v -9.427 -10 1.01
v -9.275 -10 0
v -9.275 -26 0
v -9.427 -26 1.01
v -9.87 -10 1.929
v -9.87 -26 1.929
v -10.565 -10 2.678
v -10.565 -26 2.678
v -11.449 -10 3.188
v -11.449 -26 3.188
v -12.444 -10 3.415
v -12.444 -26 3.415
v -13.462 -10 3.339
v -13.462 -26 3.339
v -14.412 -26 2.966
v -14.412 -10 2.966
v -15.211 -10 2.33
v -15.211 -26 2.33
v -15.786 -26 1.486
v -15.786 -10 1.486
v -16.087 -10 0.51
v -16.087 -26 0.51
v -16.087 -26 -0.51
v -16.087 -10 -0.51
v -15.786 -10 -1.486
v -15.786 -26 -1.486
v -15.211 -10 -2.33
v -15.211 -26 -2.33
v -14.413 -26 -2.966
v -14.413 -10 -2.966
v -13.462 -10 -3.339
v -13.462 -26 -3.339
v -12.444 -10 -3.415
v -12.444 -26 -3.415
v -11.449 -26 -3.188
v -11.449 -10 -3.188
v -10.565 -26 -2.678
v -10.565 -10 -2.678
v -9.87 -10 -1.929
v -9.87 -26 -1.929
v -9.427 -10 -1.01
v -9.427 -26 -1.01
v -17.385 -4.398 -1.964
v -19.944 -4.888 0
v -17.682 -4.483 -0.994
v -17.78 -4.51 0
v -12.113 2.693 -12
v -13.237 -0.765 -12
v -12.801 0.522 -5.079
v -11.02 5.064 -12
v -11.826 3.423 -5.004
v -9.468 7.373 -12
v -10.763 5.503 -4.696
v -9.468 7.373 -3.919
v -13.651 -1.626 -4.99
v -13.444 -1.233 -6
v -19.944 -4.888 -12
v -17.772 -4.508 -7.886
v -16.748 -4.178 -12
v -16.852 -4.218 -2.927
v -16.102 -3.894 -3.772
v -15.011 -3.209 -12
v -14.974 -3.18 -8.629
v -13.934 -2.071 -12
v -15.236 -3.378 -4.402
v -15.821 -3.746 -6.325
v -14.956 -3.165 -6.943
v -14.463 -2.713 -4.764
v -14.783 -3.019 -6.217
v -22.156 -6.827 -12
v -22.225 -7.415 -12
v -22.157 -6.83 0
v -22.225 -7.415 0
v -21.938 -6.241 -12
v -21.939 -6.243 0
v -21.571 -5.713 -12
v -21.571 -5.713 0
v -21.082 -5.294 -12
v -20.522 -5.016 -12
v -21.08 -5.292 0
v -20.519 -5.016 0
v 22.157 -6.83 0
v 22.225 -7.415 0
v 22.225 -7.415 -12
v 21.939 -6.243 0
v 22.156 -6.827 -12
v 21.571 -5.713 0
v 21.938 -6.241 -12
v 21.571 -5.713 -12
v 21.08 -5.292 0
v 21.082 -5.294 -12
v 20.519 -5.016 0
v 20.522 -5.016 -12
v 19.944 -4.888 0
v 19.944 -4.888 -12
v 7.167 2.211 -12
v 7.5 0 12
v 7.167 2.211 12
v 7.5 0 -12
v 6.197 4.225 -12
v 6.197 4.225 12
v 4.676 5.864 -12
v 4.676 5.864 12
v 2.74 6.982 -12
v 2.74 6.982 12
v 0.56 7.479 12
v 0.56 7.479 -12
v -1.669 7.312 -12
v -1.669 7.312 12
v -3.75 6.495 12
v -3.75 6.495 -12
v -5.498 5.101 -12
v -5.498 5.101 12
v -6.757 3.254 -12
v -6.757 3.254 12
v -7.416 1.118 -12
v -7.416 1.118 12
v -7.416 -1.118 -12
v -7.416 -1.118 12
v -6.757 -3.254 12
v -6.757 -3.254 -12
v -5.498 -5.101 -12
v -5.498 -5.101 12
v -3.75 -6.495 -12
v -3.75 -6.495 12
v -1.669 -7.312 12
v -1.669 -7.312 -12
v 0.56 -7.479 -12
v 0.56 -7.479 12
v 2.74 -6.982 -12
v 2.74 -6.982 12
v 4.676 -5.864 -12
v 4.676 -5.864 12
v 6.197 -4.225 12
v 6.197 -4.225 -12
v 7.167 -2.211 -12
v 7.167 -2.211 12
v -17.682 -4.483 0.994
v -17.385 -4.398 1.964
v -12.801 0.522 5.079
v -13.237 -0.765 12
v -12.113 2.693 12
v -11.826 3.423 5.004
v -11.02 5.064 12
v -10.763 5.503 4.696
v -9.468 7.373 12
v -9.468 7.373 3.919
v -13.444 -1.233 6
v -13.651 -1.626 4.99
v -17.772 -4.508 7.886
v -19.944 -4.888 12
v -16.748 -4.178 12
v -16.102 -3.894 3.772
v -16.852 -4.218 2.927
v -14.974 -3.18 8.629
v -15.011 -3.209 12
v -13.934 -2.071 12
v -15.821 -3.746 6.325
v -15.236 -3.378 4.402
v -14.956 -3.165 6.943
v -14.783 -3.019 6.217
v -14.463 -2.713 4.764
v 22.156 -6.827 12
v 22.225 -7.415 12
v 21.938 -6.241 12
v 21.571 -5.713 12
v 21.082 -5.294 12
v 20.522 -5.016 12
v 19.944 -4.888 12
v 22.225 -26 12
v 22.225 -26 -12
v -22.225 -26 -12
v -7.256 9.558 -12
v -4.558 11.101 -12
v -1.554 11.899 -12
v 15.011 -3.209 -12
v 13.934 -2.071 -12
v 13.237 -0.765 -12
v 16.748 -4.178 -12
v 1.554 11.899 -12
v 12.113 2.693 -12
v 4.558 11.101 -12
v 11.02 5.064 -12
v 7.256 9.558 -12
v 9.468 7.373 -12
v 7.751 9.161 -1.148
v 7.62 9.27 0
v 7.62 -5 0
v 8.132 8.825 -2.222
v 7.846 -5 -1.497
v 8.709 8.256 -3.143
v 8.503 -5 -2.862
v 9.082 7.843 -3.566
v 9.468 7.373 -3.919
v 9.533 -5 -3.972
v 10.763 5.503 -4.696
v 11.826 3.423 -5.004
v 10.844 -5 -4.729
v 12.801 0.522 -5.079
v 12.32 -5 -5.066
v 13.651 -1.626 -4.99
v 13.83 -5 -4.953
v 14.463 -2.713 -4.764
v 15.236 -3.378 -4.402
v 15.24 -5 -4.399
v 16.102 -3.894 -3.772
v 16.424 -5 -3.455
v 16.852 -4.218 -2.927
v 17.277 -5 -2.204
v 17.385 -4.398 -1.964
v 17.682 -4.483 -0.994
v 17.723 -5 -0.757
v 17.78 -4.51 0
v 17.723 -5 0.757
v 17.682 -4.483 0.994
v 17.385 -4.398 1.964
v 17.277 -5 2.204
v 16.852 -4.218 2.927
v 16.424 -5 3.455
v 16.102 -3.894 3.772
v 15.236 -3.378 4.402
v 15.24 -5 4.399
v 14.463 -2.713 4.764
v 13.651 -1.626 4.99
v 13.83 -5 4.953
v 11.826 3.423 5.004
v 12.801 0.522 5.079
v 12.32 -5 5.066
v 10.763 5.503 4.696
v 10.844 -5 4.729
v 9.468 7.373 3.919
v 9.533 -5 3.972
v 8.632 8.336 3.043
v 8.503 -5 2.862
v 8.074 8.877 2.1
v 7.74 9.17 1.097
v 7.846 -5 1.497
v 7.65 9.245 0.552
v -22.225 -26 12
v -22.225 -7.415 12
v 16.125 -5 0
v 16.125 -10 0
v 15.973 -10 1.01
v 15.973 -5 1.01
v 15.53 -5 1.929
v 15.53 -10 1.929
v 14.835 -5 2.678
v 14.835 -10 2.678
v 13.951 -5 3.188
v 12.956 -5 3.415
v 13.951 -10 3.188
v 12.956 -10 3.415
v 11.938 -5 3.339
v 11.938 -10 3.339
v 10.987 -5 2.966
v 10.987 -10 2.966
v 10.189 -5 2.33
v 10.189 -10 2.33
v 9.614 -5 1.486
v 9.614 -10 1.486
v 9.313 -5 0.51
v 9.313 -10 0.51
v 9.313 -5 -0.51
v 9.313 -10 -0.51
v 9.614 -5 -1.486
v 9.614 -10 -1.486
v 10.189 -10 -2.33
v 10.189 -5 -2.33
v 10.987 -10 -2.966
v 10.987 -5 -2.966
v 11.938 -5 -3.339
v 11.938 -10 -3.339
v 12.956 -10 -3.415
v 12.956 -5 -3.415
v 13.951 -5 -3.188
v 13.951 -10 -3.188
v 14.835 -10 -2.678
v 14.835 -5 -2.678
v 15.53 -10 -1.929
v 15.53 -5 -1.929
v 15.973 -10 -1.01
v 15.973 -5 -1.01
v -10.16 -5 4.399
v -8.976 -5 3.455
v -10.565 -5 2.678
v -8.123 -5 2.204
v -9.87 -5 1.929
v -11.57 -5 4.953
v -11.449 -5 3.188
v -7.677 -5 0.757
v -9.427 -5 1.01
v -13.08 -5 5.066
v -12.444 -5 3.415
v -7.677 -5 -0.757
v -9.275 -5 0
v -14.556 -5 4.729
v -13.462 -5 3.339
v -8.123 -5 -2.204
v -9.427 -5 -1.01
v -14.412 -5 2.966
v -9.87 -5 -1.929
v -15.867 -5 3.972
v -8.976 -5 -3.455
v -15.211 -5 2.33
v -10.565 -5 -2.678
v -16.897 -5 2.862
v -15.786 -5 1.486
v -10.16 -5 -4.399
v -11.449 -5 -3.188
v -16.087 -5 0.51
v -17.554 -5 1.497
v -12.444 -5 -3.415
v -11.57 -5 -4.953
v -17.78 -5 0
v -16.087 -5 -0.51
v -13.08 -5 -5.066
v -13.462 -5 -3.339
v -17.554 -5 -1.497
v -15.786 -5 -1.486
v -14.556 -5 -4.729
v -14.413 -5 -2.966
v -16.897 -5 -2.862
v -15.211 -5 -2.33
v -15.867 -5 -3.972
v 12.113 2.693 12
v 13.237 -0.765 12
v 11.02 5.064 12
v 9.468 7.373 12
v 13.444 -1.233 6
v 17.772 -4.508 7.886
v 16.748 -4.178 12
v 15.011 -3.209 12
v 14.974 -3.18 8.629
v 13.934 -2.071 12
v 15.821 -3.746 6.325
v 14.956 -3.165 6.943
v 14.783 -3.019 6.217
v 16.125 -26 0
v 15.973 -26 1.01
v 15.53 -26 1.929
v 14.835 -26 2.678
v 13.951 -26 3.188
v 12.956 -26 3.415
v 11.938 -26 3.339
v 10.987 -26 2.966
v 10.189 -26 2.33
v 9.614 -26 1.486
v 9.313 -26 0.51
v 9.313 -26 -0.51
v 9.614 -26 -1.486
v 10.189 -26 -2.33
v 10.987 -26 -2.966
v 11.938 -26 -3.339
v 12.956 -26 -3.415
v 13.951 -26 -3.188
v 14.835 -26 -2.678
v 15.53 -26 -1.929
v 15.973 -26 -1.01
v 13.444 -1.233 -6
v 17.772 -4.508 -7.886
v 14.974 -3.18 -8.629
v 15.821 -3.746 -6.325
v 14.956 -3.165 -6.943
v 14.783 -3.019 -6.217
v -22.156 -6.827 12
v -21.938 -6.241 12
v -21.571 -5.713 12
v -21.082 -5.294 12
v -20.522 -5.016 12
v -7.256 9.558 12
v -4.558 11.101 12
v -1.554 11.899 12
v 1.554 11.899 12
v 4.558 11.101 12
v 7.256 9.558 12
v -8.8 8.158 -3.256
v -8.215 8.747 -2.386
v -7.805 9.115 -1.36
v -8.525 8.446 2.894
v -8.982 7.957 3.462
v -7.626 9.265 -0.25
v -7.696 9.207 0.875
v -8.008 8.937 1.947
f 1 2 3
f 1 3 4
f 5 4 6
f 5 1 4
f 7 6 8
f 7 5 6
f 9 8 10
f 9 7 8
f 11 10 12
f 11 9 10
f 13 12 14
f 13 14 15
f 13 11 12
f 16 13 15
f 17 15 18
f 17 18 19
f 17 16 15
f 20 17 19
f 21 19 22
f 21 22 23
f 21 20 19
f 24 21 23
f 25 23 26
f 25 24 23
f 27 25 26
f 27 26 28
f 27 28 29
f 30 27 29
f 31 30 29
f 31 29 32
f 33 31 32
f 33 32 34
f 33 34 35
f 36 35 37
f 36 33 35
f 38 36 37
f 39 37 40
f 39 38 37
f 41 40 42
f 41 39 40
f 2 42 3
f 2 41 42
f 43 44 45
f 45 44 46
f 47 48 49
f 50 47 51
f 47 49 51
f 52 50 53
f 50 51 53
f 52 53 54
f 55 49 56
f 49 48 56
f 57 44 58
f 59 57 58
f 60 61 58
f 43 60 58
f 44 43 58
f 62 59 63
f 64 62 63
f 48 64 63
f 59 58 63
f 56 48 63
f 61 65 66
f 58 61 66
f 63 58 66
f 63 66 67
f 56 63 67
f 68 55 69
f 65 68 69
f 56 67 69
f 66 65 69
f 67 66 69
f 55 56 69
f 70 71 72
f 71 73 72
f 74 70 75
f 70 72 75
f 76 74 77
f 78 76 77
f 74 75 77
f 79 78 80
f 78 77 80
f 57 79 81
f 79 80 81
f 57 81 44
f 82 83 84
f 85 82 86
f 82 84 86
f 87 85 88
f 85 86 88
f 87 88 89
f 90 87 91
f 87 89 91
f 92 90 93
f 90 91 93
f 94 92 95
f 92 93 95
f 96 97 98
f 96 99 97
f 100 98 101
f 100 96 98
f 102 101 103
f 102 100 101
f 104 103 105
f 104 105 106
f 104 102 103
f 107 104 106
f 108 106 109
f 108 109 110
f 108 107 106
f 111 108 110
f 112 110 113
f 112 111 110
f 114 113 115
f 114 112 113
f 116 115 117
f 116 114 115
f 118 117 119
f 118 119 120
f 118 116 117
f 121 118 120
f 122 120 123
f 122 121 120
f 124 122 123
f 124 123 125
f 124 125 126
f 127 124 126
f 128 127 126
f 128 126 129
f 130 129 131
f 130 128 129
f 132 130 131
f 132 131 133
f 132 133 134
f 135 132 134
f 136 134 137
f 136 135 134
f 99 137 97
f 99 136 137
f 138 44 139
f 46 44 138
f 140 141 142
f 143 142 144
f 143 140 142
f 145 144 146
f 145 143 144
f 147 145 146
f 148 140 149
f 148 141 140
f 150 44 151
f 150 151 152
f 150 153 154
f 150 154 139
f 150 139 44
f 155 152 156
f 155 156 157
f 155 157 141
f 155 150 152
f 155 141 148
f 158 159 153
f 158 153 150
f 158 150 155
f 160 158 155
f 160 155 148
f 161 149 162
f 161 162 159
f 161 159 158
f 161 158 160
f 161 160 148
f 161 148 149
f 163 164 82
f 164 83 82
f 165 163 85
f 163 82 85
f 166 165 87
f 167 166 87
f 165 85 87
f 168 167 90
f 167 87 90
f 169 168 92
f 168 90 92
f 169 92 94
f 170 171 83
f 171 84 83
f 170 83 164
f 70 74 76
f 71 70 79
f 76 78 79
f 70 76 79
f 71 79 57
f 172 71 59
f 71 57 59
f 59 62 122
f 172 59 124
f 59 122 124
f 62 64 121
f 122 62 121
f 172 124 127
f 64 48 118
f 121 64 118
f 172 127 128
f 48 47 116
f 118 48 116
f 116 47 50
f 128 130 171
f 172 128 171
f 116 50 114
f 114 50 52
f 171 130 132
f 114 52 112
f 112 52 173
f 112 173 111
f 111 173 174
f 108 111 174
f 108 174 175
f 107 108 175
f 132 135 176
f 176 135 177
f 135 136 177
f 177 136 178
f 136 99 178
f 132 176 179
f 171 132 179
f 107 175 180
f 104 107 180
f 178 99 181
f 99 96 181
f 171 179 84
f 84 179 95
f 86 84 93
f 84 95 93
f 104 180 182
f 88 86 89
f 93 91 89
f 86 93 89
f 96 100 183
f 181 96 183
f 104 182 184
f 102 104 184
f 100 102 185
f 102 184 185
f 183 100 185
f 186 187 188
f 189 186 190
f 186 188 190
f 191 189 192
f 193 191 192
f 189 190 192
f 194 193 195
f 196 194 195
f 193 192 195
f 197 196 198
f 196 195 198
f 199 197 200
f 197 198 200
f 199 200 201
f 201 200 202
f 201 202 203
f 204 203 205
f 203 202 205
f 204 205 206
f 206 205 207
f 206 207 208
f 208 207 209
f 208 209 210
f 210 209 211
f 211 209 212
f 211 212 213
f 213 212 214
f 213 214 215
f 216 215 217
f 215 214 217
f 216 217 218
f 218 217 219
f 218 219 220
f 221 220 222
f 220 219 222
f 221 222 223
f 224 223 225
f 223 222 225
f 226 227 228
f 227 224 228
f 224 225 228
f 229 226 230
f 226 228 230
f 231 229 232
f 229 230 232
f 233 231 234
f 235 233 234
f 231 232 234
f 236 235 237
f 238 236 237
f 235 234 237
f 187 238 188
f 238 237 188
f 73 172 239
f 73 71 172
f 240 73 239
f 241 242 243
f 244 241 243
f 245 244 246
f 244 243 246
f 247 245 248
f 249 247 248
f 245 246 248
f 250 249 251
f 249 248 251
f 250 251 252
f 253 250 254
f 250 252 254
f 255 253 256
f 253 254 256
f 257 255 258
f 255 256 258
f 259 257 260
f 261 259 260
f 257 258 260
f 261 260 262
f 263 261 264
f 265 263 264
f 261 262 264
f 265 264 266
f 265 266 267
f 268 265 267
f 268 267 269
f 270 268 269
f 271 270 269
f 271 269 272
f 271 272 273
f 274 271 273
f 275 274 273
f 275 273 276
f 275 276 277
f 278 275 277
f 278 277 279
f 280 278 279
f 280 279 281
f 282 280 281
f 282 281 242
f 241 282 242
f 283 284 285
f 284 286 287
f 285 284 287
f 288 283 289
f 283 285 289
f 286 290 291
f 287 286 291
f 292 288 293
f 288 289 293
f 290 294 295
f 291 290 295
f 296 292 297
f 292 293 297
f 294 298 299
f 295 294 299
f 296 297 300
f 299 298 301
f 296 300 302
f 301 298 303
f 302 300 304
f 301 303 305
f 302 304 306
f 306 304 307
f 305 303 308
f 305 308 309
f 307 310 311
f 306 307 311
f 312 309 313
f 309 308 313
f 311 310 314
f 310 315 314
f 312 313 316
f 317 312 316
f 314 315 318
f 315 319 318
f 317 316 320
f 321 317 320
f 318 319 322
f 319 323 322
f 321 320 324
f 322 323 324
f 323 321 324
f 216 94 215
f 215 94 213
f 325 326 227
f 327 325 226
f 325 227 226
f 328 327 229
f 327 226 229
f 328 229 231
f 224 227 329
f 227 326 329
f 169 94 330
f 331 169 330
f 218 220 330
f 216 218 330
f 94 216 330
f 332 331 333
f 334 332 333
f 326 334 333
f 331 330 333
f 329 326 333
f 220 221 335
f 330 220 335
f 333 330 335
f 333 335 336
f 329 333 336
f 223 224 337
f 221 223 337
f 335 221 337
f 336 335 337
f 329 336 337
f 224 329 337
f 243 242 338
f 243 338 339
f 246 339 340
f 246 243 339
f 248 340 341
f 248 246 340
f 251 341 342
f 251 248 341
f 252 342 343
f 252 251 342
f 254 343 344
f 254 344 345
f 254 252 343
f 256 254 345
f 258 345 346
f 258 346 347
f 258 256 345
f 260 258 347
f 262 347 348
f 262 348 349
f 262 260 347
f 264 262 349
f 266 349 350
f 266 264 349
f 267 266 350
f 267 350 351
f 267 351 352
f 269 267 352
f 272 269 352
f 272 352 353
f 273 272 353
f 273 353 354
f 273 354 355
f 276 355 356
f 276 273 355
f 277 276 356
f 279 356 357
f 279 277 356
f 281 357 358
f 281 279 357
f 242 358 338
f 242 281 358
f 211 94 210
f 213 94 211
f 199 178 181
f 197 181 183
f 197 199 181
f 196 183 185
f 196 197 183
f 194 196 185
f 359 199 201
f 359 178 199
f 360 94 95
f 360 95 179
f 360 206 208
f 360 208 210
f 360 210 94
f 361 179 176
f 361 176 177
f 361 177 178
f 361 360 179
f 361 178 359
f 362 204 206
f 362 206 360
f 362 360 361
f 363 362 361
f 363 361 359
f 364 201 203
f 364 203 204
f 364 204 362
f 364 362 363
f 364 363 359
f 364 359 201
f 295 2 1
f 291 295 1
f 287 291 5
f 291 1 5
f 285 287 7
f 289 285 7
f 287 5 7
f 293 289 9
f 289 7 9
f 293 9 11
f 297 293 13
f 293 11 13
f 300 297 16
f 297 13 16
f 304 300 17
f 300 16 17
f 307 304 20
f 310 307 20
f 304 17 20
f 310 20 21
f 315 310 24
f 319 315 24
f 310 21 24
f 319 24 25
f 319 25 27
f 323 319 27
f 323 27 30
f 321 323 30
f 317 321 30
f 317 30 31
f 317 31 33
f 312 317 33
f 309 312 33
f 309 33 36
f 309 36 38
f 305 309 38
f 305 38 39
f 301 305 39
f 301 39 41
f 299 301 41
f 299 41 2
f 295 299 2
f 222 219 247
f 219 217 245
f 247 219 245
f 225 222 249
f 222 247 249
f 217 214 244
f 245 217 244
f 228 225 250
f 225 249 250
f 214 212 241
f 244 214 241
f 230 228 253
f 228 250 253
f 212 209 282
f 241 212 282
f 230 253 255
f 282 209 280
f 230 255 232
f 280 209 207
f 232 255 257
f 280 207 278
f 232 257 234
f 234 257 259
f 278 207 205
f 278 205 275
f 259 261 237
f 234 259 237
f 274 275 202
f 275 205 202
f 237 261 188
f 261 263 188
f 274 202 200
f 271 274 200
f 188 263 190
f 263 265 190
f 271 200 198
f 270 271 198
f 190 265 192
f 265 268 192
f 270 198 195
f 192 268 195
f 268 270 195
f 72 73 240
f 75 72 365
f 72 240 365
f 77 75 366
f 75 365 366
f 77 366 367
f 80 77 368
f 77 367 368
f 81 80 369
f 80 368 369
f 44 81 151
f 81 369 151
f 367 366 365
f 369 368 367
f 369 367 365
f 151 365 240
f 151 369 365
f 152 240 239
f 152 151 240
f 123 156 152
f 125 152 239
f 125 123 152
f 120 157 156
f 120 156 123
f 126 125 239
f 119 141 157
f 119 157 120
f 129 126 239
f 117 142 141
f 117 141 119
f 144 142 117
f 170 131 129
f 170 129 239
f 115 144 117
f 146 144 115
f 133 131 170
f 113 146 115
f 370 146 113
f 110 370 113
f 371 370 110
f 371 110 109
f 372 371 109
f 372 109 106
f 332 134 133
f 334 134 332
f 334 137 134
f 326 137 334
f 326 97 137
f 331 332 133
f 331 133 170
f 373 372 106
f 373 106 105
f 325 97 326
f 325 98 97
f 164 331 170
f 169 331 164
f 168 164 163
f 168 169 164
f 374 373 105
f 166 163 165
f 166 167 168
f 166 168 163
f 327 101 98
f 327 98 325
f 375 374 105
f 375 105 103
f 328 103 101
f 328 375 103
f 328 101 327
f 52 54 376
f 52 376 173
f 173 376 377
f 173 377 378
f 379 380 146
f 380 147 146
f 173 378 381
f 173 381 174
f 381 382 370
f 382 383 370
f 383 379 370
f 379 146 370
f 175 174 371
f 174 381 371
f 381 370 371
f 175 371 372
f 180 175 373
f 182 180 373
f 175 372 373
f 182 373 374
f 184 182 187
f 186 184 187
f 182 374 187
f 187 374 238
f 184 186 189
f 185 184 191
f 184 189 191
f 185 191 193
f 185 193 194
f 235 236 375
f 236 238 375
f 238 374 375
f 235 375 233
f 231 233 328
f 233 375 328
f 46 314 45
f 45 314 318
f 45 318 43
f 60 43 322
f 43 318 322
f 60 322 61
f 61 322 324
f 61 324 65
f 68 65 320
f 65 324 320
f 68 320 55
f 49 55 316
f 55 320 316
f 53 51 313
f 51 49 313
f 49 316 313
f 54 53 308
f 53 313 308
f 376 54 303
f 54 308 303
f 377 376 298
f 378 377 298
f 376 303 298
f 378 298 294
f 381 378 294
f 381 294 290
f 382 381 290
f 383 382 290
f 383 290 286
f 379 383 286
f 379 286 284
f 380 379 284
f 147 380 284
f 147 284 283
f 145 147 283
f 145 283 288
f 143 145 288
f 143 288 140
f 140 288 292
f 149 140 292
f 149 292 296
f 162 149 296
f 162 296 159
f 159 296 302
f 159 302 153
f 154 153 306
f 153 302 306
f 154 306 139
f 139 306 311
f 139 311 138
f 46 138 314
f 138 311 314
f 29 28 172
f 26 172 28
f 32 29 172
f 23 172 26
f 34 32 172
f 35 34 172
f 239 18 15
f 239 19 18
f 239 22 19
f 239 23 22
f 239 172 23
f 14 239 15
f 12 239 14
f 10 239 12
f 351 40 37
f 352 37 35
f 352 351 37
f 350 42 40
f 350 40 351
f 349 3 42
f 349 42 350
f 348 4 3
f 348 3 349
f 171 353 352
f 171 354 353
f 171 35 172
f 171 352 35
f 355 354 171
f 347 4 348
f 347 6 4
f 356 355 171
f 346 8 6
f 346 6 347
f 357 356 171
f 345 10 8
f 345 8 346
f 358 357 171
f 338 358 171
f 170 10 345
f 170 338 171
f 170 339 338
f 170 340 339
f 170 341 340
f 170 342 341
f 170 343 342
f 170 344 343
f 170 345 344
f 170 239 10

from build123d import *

# Parameters (mm, degrees)
SKETCH1_R           = 7.5
BOSS_EXTRUDE1_DEPTH = 12
SKETCH3_R           = 3.425
CUT_EXTRUDE1_DEPTH  = 23.0000001
FILLET1_R           = 2.54
SKETCH4_R           = 5.08
CUT_EXTRUDE2_DEPTH  = 18.000000194
SKETCH5_W           = 44.45
SKETCH5_H           = 24
SKETCH5_R           = 3.425
BOSS_EXTRUDE2_DEPTH = 16


with BuildPart() as part:
    # Sketch1 → Boss-Extrude1 (new body, symmetric)
    with BuildSketch(Plane.XY):
        with BuildLine():
            Line((22.225, -10), (-22.225, -10))
            Line((-22.225, -10), (-22.225, -5))
            add(Edge.make_bspline(
                [(-22.225, -5), (-16.631079064, -4.98201906), (-12.322747723, -1.728386223), (-12.530535341, 3.440374129), (-9.467504716, 7.373354356)],
                knots=[0, 0, 0, 0, 0.501954987, 1, 1, 1, 1], degree=3))
            ThreePointArc((-9.467504716, 7.373354356), (0, 12), (9.467504716, 7.373354356))
            add(Edge.make_bspline(
                [(22.225, -5), (16.631079064, -4.98201906), (12.322747723, -1.728386223), (12.530535341, 3.440374129), (9.467504716, 7.373354356)],
                knots=[0, 0, 0, 0, 0.501954987, 1, 1, 1, 1], degree=3))
            Line((22.225, -5), (22.225, -10))
        make_face()
        Circle(SKETCH1_R, mode=Mode.SUBTRACT)
    extrude(amount=BOSS_EXTRUDE1_DEPTH, both=True)

    # Sketch3 → Cut-Extrude1 (cut, through all)
    with BuildSketch(Plane.XZ.offset(10)):
        with Locations((-12.7, 0)):
            Circle(SKETCH3_R)
        with Locations((12.7, 0)):
            Circle(SKETCH3_R)
    extrude(amount=-CUT_EXTRUDE1_DEPTH, mode=Mode.SUBTRACT)

    # Fillet1
    fillet1_edges = [part.edges().sort_by_distance(p)[0] for p in [
        (22.225, -5, -6),
        (-22.225, -5, 6),
    ]]
    fillet(fillet1_edges, radius=FILLET1_R)

    # Sketch4 → Cut-Extrude2 (cut, through all)
    with BuildSketch(Plane(origin=(0, -5.000000094, 0), x_dir=(-1, 0, 0), z_dir=(0, -1, 0))):
        with Locations((12.7, 0)):
            Circle(SKETCH4_R)
        with Locations((-12.7, 0)):
            Circle(SKETCH4_R)
    extrude(amount=-CUT_EXTRUDE2_DEPTH, mode=Mode.SUBTRACT)

    # Sketch5 → Boss-Extrude2 (add)
    with BuildSketch(Plane.XZ.offset(10)):
        Rectangle(SKETCH5_W, SKETCH5_H)
        with Locations((12.7, 0)):
            Circle(SKETCH5_R, mode=Mode.SUBTRACT)
        with Locations((-12.7, 0)):
            Circle(SKETCH5_R, mode=Mode.SUBTRACT)
    extrude(amount=BOSS_EXTRUDE2_DEPTH)


solid = part.part
